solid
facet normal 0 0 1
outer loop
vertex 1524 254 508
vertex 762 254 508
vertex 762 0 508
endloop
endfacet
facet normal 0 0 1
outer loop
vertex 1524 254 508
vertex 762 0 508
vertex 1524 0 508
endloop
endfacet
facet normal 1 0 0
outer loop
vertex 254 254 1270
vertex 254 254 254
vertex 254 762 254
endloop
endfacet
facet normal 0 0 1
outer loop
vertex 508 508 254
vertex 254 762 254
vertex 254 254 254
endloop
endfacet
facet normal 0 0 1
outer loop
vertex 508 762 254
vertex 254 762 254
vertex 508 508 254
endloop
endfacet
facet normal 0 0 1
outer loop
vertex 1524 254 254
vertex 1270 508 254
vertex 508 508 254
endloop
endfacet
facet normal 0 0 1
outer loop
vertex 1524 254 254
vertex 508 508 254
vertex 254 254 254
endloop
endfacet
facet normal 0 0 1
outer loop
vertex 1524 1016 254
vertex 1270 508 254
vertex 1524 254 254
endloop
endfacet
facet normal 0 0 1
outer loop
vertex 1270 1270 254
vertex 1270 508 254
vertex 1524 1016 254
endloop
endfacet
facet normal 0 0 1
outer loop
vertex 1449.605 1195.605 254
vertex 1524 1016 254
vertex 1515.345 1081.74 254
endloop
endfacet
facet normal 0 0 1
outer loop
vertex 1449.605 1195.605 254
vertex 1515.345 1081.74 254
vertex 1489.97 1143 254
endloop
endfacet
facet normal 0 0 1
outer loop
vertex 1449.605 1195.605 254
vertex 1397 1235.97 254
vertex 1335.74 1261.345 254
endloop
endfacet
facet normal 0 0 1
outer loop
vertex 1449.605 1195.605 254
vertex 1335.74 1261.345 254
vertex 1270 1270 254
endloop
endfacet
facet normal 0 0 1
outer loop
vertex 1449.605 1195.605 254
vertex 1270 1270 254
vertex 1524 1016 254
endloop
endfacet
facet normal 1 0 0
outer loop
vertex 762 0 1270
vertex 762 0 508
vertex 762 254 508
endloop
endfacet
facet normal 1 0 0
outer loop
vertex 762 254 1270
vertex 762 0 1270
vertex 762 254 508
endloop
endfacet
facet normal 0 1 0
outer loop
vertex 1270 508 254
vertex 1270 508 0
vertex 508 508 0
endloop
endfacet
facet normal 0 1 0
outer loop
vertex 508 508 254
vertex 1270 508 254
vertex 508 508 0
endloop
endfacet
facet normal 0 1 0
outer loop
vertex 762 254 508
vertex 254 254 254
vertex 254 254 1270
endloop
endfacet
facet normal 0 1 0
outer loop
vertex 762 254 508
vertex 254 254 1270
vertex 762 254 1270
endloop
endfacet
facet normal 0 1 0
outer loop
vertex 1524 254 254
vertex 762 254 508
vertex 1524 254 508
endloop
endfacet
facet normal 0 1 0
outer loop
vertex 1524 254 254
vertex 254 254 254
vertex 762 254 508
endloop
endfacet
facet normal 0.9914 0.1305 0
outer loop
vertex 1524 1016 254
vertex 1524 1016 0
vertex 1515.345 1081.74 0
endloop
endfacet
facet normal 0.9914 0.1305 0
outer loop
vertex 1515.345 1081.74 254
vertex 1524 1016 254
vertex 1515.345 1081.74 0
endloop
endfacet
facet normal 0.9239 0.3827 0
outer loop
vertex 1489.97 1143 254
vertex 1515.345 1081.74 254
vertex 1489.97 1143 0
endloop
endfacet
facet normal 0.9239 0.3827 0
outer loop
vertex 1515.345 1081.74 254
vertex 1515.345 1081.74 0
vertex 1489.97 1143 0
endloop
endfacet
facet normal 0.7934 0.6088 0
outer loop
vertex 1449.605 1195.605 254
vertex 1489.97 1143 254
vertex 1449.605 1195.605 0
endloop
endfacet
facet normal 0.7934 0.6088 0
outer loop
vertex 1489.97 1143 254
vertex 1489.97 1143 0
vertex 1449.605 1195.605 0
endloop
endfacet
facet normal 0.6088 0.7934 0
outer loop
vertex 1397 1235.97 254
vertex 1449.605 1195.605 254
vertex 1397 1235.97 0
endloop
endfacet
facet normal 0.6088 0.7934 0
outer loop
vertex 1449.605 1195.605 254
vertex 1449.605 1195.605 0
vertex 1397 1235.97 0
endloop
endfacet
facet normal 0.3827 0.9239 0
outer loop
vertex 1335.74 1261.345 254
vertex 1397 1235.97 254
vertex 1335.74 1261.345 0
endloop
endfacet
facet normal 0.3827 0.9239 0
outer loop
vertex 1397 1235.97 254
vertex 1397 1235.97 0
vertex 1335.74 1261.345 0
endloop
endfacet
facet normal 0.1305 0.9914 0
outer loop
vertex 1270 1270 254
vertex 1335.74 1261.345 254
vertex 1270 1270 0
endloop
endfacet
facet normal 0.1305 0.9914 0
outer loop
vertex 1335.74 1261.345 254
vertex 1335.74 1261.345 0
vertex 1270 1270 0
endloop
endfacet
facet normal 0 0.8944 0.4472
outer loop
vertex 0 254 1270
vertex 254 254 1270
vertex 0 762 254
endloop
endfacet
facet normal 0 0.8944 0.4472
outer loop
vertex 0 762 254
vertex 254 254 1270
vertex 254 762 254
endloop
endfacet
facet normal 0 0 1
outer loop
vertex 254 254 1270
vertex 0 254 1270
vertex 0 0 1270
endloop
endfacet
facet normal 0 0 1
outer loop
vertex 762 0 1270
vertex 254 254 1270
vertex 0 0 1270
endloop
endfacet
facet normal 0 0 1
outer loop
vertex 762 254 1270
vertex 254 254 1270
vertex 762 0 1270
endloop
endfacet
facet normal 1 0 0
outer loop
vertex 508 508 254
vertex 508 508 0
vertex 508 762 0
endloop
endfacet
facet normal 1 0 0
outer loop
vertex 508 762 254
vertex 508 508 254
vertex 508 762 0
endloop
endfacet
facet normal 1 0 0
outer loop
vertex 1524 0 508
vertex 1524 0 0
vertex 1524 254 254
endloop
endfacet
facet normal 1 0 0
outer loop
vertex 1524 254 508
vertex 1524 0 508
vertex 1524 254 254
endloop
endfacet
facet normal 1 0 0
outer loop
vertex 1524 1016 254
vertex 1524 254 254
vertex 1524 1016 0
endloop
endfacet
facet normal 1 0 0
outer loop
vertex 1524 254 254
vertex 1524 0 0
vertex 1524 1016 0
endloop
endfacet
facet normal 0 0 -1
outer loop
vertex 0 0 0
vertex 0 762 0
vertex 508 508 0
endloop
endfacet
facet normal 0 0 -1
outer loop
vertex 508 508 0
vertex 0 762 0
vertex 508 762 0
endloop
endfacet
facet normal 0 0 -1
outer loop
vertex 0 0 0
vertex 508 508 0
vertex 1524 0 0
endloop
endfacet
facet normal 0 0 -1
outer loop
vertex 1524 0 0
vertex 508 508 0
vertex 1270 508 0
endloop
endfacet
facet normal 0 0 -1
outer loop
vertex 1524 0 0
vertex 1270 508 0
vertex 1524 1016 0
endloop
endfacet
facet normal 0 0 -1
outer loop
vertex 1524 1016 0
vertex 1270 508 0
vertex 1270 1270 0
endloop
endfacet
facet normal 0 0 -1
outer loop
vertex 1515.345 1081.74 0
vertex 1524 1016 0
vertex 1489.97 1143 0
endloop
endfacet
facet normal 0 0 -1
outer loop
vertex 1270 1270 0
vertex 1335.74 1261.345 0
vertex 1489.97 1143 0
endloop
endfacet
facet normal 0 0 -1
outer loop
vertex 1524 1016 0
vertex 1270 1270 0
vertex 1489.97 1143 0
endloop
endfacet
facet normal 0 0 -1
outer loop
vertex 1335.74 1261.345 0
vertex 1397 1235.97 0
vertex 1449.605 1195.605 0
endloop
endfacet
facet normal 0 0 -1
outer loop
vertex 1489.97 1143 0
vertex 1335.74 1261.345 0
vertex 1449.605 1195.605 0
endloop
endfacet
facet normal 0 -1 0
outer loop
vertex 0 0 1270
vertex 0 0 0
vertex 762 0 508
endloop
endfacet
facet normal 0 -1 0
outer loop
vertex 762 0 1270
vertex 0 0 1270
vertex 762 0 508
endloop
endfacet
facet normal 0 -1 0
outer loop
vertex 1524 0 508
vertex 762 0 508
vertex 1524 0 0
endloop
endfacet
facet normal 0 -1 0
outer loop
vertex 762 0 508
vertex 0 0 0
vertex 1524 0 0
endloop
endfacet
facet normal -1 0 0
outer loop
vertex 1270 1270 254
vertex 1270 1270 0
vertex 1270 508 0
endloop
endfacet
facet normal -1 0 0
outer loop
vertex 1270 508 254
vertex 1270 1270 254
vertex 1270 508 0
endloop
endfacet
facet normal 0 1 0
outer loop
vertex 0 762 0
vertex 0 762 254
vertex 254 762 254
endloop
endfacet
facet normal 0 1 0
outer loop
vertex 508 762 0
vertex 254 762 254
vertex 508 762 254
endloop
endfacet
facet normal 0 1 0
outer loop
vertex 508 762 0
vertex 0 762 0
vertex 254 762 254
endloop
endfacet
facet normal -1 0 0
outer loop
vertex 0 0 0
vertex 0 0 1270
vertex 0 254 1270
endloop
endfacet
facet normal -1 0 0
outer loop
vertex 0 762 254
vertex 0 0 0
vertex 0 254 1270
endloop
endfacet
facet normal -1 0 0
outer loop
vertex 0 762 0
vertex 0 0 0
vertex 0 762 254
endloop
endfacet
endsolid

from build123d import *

# Parameters (mm, degrees)
BOSS_EXTRUDE1_DEPTH     = 1270
SKETCH1_5_W             = 762
SKETCH1_5_H             = 254
BOSS_EXTRUDE2_DEPTH     = 508
BOSS_EXTRUDE3_DEPTH     = 254
SKETCH1_7_W             = 254
SKETCH1_7_H             = 508
BOSS_EXTRUDE4_DEPTH     = 1270
CUT_EXTRUDE1_DEPTH      = 254
CUT_EXTRUDE1_DEPTH_BACK = 255


with BuildPart() as part:
    # Sketch1 → Boss-Extrude1 (new body)
    with BuildSketch(Plane.XY):
        Polygon((0, 254), (0, 0), (762, 0), (762, 254), (254, 254), align=None)
    extrude(amount=BOSS_EXTRUDE1_DEPTH)

    # Sketch1<5> → Boss-Extrude2 (add)
    with BuildSketch(Plane.XY):
        with Locations((1143, 127)):
            Rectangle(SKETCH1_5_W, SKETCH1_5_H)
    extrude(amount=BOSS_EXTRUDE2_DEPTH)

    # Sketch1<6> → Boss-Extrude3 (add)
    with BuildSketch(Plane.XY):
        with BuildLine():
            Line((254, 762), (254, 254))
            Line((254, 254), (762, 254))
            Line((762, 254), (1524, 254))
            Line((1524, 254), (1524, 1015.999999044))
            ThreePointArc((1524, 1015.999999044), (1449.605122957, 1195.605122281), (1270, 1270))
            Line((1270, 1270), (1270, 508))
            Line((1270, 508), (508, 508))
            Line((508, 508), (508, 762))
            Line((508, 762), (254, 762))
        make_face()
    extrude(amount=BOSS_EXTRUDE3_DEPTH)

    # Sketch1<7> → Boss-Extrude4 (add)
    with BuildSketch(Plane.XY):
        with Locations((127, 508)):
            Rectangle(SKETCH1_7_W, SKETCH1_7_H)
    extrude(amount=BOSS_EXTRUDE4_DEPTH)

    # Sketch2 → Cut-Extrude1 (cut, two sides)
    with BuildSketch(Plane(origin=(254, 0, 0), x_dir=(0, 0, -1), z_dir=(1, 0, 0))) as cut_extrude1_sk:
        Polygon((2664.325511968, 2221.162755984), (-254, 762), (-1270, 254), (-4188.325511968, -1205.162755984), (-7106.651023936, 4631.488267952), (-254, 8057.813779919), align=None)
    extrude(amount=CUT_EXTRUDE1_DEPTH, mode=Mode.SUBTRACT)
    extrude(cut_extrude1_sk.sketch, amount=-CUT_EXTRUDE1_DEPTH_BACK, mode=Mode.SUBTRACT)


solid = part.part
